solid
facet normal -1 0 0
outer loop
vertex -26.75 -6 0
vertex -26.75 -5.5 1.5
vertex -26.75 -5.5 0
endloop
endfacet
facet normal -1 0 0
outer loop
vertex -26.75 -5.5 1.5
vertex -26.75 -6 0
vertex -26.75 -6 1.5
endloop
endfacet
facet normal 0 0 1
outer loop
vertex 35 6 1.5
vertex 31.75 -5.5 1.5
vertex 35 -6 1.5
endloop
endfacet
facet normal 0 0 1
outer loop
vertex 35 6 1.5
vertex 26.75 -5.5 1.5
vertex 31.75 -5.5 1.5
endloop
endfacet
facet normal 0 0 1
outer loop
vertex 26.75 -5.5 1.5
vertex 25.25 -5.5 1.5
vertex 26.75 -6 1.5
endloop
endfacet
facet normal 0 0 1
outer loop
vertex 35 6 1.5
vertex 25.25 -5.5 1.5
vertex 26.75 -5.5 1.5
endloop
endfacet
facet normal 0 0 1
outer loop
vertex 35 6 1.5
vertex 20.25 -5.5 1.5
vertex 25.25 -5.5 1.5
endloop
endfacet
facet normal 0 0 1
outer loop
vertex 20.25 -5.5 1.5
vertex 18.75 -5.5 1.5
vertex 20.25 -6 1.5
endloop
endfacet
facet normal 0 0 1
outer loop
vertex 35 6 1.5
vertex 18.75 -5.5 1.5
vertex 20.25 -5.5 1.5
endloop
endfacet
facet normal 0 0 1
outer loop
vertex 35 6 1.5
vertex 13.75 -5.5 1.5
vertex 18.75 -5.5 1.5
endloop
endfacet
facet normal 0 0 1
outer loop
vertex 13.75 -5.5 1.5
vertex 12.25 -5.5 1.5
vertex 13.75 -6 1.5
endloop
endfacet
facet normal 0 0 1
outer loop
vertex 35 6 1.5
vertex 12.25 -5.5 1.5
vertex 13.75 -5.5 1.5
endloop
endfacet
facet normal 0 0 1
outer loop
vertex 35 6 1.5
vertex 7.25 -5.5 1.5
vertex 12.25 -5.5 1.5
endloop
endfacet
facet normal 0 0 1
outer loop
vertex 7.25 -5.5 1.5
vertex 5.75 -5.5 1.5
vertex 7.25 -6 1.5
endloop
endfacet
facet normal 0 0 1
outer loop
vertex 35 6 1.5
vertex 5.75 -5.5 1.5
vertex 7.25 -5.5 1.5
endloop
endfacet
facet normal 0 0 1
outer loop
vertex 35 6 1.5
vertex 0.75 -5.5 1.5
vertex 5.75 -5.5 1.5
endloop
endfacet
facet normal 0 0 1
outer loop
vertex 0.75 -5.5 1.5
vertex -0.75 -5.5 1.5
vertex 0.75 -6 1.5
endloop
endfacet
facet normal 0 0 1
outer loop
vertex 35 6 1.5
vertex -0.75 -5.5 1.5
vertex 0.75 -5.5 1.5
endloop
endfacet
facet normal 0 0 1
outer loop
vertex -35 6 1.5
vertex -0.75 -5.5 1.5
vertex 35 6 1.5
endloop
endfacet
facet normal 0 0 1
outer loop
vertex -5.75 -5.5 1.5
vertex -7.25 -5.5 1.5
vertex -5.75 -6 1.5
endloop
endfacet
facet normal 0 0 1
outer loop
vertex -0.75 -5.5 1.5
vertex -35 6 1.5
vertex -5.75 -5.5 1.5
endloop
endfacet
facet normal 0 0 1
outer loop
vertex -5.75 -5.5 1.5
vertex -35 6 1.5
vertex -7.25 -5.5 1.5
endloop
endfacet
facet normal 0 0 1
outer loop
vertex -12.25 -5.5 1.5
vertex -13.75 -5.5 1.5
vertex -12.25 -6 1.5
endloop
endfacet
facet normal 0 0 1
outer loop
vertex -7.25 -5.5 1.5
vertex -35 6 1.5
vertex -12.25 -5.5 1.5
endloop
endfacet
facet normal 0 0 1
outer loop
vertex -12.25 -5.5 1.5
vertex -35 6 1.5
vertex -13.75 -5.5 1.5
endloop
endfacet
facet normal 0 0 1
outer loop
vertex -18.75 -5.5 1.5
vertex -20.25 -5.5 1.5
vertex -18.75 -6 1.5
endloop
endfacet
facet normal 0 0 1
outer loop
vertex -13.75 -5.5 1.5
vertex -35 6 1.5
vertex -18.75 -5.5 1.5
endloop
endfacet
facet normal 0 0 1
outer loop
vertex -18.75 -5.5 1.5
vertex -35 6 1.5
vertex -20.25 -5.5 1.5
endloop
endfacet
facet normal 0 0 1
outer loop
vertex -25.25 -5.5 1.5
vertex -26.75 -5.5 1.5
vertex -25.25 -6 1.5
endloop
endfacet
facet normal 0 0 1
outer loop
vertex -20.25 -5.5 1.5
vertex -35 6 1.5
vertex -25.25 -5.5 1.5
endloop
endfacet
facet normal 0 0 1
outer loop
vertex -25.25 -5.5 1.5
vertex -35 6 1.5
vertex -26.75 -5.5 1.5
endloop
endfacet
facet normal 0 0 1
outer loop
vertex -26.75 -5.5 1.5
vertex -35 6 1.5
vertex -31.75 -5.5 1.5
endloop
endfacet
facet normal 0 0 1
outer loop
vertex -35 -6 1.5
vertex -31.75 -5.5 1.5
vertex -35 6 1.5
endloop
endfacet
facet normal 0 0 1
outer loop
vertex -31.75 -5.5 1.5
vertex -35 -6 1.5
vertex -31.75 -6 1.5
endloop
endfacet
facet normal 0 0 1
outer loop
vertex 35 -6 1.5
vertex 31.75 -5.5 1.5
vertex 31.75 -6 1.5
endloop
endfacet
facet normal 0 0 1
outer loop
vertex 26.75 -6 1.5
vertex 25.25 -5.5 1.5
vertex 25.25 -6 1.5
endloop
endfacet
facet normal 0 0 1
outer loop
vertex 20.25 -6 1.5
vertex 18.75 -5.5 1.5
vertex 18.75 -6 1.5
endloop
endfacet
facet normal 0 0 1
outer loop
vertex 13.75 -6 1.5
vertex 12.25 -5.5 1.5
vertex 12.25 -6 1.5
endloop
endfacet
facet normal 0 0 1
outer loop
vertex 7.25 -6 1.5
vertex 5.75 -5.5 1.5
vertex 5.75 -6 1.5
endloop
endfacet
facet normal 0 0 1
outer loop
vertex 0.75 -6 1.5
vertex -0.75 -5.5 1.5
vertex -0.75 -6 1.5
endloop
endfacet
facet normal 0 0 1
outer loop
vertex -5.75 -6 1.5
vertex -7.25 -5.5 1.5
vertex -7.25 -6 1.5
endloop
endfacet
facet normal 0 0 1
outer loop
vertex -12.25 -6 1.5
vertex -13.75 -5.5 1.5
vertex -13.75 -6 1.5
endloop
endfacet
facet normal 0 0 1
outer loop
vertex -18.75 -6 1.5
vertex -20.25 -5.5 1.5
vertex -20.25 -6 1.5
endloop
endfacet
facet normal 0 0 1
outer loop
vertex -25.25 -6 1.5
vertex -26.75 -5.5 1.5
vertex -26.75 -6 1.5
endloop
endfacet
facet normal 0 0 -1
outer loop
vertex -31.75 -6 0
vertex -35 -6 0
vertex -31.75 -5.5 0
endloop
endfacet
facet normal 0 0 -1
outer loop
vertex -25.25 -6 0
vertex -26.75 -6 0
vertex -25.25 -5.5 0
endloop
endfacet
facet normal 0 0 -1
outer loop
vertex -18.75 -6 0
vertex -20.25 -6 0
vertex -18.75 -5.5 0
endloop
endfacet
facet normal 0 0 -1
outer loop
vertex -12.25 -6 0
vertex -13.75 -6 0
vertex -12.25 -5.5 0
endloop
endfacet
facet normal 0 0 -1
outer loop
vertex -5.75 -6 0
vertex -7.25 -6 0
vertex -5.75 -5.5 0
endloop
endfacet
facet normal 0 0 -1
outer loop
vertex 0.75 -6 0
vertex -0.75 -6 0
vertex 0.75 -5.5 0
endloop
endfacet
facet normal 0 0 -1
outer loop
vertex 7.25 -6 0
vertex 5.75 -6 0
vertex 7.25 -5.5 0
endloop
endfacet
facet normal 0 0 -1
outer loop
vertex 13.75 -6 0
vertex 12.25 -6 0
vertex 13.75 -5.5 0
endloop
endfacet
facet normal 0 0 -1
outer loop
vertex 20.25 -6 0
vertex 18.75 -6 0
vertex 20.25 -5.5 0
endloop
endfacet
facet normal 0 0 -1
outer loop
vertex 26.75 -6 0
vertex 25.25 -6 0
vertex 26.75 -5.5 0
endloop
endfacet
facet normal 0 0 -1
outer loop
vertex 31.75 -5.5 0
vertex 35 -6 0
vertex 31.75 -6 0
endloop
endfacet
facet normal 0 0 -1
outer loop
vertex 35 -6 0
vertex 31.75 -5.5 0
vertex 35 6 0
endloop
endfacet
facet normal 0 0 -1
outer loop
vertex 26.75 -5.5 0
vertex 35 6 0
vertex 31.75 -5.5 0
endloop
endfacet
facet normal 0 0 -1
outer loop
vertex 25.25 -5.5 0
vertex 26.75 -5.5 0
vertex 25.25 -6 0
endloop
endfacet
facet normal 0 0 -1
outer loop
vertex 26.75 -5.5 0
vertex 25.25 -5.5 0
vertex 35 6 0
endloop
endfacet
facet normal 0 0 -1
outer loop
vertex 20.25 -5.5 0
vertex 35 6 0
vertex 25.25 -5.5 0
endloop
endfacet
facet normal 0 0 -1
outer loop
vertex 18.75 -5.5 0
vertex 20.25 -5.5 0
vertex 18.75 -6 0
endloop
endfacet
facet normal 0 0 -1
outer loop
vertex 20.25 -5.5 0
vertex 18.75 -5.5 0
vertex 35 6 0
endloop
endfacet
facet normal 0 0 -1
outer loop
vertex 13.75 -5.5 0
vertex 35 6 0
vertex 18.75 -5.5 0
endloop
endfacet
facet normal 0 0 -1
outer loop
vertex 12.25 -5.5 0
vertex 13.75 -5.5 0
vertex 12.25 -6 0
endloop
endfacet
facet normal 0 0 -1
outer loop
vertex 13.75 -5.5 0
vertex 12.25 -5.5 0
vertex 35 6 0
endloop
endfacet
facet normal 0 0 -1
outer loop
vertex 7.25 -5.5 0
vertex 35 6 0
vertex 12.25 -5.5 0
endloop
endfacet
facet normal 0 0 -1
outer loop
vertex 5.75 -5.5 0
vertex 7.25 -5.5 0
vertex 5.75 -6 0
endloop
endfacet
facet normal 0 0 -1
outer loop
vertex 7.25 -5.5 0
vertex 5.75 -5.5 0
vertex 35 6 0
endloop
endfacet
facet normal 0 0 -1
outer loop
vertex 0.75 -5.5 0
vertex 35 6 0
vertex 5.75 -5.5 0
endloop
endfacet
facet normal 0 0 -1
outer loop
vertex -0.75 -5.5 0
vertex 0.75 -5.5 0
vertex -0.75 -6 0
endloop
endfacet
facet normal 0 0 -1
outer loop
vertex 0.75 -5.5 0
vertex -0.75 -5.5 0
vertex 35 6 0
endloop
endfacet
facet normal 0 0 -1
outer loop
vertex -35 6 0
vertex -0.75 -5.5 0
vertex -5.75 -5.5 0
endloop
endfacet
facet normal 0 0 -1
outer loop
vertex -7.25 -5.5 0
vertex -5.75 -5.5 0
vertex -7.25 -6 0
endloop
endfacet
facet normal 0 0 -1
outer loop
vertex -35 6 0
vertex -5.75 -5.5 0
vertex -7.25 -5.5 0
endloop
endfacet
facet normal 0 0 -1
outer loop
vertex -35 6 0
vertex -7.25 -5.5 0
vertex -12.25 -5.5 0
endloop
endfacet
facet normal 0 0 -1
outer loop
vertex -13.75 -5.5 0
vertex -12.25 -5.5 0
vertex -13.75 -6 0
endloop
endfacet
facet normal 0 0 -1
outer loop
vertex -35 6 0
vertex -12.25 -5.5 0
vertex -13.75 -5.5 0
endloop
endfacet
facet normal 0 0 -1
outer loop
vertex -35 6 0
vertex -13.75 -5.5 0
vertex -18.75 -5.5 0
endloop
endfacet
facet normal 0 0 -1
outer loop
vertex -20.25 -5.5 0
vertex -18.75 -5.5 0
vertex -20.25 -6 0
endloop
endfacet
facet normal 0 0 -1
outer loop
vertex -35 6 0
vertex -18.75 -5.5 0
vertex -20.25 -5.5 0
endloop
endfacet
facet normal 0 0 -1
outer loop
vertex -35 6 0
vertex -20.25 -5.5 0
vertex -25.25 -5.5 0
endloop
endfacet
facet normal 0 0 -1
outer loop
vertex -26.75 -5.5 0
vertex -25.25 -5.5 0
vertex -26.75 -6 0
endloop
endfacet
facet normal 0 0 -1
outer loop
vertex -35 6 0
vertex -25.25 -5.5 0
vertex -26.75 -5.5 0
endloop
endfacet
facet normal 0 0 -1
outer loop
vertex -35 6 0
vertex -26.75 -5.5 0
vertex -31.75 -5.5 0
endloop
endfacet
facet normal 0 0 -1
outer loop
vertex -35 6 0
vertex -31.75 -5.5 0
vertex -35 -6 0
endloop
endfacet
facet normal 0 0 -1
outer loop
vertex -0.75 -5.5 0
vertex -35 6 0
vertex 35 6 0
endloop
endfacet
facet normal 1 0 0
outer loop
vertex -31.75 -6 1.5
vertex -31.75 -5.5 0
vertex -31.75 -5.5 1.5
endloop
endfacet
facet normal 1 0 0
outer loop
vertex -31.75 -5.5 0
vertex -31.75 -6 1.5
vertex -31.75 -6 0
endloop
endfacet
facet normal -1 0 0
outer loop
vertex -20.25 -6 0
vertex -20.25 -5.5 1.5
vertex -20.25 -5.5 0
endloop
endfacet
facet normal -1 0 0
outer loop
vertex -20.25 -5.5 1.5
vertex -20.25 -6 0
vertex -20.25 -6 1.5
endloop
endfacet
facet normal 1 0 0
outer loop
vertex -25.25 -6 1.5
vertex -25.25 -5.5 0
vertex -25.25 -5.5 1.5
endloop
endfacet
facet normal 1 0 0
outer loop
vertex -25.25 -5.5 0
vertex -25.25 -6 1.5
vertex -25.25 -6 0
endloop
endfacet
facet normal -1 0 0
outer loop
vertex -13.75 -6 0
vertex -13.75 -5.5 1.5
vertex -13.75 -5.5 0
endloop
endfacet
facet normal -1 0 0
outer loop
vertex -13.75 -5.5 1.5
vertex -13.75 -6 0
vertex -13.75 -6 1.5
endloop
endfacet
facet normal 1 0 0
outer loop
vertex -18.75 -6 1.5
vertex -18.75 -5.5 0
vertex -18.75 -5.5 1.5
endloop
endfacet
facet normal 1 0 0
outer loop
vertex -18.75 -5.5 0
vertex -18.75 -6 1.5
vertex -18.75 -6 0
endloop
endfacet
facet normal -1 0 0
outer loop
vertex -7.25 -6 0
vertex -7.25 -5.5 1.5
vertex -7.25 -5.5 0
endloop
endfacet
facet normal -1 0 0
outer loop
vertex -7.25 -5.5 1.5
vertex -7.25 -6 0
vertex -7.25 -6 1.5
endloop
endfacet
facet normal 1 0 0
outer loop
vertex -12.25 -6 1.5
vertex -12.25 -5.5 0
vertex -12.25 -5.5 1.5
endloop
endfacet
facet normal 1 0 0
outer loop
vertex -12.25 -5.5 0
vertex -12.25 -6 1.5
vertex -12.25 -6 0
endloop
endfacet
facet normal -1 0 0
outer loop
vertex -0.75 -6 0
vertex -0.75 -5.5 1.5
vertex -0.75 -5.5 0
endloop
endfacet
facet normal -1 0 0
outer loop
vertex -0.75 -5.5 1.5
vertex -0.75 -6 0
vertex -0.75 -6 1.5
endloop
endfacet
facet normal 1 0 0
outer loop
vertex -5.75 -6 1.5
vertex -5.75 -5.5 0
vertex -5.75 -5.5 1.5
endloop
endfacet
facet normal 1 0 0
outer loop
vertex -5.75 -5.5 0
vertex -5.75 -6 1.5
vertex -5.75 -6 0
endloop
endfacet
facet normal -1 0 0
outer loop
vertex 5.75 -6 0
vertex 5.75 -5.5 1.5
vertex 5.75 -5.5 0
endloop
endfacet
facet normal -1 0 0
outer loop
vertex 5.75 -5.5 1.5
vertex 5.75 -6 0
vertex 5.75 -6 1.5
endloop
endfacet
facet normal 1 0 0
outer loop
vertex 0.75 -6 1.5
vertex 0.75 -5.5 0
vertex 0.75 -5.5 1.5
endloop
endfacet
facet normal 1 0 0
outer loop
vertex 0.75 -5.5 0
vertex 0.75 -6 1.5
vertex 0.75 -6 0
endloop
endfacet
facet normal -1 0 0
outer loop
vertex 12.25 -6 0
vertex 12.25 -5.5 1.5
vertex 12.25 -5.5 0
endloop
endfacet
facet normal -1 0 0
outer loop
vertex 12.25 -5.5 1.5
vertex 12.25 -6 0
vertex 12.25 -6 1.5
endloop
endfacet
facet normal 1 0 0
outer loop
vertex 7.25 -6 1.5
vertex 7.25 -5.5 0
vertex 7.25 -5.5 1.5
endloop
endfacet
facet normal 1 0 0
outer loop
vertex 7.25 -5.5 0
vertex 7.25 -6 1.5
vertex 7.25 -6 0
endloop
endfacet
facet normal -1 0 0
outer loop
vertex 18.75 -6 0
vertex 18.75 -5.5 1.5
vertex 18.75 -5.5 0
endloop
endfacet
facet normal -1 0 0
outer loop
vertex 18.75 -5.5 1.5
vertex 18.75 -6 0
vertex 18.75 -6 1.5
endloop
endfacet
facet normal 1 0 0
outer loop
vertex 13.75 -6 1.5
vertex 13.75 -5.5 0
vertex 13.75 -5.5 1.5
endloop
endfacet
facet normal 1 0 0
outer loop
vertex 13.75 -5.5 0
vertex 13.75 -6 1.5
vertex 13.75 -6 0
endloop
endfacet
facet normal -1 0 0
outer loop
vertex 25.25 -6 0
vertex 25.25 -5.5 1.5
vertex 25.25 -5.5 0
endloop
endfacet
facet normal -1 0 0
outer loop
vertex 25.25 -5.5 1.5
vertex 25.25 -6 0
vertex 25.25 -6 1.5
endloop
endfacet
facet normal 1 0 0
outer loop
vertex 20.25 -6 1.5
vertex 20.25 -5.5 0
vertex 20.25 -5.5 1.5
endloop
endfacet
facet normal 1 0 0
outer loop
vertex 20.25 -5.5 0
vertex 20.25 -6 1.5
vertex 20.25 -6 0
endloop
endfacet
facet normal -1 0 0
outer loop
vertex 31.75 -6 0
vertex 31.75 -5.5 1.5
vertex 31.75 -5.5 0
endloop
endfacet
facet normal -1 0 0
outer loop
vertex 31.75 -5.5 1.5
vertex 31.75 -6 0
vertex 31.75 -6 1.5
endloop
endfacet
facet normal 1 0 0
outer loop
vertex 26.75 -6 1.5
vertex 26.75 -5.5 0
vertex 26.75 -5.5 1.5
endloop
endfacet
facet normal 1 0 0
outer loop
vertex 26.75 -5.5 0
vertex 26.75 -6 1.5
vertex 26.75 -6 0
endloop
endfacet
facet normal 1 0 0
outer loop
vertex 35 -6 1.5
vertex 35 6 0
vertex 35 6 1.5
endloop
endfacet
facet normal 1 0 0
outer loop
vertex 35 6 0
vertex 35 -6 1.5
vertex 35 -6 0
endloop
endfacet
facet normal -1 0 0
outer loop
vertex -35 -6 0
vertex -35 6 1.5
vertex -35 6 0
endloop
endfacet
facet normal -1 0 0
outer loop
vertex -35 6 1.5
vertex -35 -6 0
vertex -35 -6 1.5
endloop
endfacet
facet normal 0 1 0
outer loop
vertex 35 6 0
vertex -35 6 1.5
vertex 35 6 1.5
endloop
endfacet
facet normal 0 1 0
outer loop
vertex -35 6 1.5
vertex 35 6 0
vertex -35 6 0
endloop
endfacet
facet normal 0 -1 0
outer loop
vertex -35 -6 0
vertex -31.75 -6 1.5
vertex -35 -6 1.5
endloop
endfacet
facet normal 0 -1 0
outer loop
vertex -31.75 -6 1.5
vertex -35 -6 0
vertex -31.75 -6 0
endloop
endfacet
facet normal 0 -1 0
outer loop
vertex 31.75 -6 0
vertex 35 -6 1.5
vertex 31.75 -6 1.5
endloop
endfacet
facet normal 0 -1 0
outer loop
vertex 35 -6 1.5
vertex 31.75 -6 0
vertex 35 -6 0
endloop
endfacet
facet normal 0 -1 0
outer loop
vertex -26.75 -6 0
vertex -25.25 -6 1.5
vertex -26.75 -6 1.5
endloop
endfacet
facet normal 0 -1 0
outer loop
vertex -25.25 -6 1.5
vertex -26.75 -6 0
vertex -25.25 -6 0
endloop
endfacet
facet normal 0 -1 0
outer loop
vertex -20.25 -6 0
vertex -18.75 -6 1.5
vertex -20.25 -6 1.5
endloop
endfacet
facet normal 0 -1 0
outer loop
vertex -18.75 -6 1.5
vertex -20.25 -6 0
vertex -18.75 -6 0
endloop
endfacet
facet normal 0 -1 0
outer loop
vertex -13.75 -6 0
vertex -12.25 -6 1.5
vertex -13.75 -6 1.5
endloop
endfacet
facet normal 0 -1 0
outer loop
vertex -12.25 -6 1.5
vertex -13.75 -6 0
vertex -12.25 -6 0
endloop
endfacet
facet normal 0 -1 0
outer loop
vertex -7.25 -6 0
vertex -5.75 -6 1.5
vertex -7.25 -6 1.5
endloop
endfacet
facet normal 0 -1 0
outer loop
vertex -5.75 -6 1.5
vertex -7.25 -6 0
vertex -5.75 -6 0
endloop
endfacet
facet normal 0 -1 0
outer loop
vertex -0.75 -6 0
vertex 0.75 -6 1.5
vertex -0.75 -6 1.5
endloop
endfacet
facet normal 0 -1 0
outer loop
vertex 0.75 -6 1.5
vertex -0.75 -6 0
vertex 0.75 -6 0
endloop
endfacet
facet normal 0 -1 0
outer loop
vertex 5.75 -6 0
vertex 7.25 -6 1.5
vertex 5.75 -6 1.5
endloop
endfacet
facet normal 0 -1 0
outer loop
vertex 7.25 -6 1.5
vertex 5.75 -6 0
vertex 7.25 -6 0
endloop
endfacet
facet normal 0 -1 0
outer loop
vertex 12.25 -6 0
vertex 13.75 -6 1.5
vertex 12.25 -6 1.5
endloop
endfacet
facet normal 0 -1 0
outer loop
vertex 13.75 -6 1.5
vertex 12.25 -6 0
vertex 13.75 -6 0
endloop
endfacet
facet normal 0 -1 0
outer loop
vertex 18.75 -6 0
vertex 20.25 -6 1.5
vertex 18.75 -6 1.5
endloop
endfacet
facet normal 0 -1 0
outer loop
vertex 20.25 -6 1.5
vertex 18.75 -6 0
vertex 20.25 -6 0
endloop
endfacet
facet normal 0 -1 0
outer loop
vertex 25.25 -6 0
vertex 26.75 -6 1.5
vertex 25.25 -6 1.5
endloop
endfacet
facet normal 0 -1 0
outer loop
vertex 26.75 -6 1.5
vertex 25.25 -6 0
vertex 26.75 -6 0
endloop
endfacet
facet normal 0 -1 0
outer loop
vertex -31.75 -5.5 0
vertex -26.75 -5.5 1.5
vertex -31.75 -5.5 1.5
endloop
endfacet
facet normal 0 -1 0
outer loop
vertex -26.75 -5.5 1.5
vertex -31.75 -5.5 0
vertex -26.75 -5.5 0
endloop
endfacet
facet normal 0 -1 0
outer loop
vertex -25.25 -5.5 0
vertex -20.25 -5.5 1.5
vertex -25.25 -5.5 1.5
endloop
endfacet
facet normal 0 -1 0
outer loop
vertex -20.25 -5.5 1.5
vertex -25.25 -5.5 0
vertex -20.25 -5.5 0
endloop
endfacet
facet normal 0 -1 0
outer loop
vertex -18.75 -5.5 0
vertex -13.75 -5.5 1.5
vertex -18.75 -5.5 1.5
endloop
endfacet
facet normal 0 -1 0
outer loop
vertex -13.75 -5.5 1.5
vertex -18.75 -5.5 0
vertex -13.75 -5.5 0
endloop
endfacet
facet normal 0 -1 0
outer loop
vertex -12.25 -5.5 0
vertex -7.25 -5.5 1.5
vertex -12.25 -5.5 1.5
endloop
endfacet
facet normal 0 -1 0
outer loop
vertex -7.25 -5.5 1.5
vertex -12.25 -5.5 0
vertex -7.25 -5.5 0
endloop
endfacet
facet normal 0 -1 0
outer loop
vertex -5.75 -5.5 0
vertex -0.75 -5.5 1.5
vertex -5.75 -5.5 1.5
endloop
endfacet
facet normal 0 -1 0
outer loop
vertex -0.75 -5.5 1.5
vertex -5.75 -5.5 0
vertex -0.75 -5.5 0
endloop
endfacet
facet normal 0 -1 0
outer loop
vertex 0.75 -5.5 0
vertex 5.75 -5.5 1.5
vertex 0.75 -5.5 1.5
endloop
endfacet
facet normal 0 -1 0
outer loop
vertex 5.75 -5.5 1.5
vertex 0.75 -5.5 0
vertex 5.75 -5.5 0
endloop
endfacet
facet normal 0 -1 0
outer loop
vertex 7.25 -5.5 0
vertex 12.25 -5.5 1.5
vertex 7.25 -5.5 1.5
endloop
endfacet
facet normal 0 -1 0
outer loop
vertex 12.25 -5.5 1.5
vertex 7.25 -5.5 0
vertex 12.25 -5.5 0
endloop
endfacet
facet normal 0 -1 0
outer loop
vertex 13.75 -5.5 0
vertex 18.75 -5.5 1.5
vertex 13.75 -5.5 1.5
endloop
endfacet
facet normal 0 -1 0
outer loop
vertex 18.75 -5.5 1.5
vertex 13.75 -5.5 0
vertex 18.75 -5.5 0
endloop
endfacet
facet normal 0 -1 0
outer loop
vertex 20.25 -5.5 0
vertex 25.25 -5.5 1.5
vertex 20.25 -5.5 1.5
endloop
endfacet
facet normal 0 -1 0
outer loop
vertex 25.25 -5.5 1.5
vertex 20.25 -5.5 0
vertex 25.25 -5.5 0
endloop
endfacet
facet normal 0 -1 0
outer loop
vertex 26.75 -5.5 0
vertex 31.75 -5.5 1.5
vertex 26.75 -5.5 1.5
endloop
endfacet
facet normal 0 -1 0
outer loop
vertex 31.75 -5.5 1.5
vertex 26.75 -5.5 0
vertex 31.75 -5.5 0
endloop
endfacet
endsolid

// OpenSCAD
// 10-well comb for casting agarose gels
// Print orientation: flat on bed, teeth pointing down (-Y)

// ---- Dimensions (mm) ----
plate_t      = 1.5;   // plate thickness (Z)
spine_l      = 70;    // spine length (X)
spine_w      = 12;    // spine width (Y)
tooth_w      = 5.0;   // tooth width (X)
tooth_l      = 12;    // tooth length (Y)
tooth_count  = 10;    // number of teeth
gap          = 1.5;   // gap between teeth (X)
overcut      = 0.5;   // extra length on cutters

$fn = 64;

pitch = tooth_w + gap;  // centre-to-centre tooth spacing

// ---- Model ----
difference() {
    union() {
        // Spine
        translate([-spine_l/2, -spine_w/2, 0])
            cube([spine_l, spine_w, plate_t]);

        // Teeth
        for (i = [0 : tooth_count - 1])
            translate([(i - (tooth_count - 1)/2) * pitch - tooth_w/2,
                       -spine_w/2 - tooth_l,
                       0])
                cube([tooth_w, tooth_l + plate_t, plate_t]);
    }

    // Tooth cutters (extend past -Y face)
    for (i = [0 : tooth_count - 1])
        translate([(i - (tooth_count - 1)/2) * pitch - tooth_w/2,
                   -spine_w/2 - tooth_l - overcut,
                   -overcut])
            cube([tooth_w, tooth_l + 2*overcut, plate_t + 2*overcut]);
}
